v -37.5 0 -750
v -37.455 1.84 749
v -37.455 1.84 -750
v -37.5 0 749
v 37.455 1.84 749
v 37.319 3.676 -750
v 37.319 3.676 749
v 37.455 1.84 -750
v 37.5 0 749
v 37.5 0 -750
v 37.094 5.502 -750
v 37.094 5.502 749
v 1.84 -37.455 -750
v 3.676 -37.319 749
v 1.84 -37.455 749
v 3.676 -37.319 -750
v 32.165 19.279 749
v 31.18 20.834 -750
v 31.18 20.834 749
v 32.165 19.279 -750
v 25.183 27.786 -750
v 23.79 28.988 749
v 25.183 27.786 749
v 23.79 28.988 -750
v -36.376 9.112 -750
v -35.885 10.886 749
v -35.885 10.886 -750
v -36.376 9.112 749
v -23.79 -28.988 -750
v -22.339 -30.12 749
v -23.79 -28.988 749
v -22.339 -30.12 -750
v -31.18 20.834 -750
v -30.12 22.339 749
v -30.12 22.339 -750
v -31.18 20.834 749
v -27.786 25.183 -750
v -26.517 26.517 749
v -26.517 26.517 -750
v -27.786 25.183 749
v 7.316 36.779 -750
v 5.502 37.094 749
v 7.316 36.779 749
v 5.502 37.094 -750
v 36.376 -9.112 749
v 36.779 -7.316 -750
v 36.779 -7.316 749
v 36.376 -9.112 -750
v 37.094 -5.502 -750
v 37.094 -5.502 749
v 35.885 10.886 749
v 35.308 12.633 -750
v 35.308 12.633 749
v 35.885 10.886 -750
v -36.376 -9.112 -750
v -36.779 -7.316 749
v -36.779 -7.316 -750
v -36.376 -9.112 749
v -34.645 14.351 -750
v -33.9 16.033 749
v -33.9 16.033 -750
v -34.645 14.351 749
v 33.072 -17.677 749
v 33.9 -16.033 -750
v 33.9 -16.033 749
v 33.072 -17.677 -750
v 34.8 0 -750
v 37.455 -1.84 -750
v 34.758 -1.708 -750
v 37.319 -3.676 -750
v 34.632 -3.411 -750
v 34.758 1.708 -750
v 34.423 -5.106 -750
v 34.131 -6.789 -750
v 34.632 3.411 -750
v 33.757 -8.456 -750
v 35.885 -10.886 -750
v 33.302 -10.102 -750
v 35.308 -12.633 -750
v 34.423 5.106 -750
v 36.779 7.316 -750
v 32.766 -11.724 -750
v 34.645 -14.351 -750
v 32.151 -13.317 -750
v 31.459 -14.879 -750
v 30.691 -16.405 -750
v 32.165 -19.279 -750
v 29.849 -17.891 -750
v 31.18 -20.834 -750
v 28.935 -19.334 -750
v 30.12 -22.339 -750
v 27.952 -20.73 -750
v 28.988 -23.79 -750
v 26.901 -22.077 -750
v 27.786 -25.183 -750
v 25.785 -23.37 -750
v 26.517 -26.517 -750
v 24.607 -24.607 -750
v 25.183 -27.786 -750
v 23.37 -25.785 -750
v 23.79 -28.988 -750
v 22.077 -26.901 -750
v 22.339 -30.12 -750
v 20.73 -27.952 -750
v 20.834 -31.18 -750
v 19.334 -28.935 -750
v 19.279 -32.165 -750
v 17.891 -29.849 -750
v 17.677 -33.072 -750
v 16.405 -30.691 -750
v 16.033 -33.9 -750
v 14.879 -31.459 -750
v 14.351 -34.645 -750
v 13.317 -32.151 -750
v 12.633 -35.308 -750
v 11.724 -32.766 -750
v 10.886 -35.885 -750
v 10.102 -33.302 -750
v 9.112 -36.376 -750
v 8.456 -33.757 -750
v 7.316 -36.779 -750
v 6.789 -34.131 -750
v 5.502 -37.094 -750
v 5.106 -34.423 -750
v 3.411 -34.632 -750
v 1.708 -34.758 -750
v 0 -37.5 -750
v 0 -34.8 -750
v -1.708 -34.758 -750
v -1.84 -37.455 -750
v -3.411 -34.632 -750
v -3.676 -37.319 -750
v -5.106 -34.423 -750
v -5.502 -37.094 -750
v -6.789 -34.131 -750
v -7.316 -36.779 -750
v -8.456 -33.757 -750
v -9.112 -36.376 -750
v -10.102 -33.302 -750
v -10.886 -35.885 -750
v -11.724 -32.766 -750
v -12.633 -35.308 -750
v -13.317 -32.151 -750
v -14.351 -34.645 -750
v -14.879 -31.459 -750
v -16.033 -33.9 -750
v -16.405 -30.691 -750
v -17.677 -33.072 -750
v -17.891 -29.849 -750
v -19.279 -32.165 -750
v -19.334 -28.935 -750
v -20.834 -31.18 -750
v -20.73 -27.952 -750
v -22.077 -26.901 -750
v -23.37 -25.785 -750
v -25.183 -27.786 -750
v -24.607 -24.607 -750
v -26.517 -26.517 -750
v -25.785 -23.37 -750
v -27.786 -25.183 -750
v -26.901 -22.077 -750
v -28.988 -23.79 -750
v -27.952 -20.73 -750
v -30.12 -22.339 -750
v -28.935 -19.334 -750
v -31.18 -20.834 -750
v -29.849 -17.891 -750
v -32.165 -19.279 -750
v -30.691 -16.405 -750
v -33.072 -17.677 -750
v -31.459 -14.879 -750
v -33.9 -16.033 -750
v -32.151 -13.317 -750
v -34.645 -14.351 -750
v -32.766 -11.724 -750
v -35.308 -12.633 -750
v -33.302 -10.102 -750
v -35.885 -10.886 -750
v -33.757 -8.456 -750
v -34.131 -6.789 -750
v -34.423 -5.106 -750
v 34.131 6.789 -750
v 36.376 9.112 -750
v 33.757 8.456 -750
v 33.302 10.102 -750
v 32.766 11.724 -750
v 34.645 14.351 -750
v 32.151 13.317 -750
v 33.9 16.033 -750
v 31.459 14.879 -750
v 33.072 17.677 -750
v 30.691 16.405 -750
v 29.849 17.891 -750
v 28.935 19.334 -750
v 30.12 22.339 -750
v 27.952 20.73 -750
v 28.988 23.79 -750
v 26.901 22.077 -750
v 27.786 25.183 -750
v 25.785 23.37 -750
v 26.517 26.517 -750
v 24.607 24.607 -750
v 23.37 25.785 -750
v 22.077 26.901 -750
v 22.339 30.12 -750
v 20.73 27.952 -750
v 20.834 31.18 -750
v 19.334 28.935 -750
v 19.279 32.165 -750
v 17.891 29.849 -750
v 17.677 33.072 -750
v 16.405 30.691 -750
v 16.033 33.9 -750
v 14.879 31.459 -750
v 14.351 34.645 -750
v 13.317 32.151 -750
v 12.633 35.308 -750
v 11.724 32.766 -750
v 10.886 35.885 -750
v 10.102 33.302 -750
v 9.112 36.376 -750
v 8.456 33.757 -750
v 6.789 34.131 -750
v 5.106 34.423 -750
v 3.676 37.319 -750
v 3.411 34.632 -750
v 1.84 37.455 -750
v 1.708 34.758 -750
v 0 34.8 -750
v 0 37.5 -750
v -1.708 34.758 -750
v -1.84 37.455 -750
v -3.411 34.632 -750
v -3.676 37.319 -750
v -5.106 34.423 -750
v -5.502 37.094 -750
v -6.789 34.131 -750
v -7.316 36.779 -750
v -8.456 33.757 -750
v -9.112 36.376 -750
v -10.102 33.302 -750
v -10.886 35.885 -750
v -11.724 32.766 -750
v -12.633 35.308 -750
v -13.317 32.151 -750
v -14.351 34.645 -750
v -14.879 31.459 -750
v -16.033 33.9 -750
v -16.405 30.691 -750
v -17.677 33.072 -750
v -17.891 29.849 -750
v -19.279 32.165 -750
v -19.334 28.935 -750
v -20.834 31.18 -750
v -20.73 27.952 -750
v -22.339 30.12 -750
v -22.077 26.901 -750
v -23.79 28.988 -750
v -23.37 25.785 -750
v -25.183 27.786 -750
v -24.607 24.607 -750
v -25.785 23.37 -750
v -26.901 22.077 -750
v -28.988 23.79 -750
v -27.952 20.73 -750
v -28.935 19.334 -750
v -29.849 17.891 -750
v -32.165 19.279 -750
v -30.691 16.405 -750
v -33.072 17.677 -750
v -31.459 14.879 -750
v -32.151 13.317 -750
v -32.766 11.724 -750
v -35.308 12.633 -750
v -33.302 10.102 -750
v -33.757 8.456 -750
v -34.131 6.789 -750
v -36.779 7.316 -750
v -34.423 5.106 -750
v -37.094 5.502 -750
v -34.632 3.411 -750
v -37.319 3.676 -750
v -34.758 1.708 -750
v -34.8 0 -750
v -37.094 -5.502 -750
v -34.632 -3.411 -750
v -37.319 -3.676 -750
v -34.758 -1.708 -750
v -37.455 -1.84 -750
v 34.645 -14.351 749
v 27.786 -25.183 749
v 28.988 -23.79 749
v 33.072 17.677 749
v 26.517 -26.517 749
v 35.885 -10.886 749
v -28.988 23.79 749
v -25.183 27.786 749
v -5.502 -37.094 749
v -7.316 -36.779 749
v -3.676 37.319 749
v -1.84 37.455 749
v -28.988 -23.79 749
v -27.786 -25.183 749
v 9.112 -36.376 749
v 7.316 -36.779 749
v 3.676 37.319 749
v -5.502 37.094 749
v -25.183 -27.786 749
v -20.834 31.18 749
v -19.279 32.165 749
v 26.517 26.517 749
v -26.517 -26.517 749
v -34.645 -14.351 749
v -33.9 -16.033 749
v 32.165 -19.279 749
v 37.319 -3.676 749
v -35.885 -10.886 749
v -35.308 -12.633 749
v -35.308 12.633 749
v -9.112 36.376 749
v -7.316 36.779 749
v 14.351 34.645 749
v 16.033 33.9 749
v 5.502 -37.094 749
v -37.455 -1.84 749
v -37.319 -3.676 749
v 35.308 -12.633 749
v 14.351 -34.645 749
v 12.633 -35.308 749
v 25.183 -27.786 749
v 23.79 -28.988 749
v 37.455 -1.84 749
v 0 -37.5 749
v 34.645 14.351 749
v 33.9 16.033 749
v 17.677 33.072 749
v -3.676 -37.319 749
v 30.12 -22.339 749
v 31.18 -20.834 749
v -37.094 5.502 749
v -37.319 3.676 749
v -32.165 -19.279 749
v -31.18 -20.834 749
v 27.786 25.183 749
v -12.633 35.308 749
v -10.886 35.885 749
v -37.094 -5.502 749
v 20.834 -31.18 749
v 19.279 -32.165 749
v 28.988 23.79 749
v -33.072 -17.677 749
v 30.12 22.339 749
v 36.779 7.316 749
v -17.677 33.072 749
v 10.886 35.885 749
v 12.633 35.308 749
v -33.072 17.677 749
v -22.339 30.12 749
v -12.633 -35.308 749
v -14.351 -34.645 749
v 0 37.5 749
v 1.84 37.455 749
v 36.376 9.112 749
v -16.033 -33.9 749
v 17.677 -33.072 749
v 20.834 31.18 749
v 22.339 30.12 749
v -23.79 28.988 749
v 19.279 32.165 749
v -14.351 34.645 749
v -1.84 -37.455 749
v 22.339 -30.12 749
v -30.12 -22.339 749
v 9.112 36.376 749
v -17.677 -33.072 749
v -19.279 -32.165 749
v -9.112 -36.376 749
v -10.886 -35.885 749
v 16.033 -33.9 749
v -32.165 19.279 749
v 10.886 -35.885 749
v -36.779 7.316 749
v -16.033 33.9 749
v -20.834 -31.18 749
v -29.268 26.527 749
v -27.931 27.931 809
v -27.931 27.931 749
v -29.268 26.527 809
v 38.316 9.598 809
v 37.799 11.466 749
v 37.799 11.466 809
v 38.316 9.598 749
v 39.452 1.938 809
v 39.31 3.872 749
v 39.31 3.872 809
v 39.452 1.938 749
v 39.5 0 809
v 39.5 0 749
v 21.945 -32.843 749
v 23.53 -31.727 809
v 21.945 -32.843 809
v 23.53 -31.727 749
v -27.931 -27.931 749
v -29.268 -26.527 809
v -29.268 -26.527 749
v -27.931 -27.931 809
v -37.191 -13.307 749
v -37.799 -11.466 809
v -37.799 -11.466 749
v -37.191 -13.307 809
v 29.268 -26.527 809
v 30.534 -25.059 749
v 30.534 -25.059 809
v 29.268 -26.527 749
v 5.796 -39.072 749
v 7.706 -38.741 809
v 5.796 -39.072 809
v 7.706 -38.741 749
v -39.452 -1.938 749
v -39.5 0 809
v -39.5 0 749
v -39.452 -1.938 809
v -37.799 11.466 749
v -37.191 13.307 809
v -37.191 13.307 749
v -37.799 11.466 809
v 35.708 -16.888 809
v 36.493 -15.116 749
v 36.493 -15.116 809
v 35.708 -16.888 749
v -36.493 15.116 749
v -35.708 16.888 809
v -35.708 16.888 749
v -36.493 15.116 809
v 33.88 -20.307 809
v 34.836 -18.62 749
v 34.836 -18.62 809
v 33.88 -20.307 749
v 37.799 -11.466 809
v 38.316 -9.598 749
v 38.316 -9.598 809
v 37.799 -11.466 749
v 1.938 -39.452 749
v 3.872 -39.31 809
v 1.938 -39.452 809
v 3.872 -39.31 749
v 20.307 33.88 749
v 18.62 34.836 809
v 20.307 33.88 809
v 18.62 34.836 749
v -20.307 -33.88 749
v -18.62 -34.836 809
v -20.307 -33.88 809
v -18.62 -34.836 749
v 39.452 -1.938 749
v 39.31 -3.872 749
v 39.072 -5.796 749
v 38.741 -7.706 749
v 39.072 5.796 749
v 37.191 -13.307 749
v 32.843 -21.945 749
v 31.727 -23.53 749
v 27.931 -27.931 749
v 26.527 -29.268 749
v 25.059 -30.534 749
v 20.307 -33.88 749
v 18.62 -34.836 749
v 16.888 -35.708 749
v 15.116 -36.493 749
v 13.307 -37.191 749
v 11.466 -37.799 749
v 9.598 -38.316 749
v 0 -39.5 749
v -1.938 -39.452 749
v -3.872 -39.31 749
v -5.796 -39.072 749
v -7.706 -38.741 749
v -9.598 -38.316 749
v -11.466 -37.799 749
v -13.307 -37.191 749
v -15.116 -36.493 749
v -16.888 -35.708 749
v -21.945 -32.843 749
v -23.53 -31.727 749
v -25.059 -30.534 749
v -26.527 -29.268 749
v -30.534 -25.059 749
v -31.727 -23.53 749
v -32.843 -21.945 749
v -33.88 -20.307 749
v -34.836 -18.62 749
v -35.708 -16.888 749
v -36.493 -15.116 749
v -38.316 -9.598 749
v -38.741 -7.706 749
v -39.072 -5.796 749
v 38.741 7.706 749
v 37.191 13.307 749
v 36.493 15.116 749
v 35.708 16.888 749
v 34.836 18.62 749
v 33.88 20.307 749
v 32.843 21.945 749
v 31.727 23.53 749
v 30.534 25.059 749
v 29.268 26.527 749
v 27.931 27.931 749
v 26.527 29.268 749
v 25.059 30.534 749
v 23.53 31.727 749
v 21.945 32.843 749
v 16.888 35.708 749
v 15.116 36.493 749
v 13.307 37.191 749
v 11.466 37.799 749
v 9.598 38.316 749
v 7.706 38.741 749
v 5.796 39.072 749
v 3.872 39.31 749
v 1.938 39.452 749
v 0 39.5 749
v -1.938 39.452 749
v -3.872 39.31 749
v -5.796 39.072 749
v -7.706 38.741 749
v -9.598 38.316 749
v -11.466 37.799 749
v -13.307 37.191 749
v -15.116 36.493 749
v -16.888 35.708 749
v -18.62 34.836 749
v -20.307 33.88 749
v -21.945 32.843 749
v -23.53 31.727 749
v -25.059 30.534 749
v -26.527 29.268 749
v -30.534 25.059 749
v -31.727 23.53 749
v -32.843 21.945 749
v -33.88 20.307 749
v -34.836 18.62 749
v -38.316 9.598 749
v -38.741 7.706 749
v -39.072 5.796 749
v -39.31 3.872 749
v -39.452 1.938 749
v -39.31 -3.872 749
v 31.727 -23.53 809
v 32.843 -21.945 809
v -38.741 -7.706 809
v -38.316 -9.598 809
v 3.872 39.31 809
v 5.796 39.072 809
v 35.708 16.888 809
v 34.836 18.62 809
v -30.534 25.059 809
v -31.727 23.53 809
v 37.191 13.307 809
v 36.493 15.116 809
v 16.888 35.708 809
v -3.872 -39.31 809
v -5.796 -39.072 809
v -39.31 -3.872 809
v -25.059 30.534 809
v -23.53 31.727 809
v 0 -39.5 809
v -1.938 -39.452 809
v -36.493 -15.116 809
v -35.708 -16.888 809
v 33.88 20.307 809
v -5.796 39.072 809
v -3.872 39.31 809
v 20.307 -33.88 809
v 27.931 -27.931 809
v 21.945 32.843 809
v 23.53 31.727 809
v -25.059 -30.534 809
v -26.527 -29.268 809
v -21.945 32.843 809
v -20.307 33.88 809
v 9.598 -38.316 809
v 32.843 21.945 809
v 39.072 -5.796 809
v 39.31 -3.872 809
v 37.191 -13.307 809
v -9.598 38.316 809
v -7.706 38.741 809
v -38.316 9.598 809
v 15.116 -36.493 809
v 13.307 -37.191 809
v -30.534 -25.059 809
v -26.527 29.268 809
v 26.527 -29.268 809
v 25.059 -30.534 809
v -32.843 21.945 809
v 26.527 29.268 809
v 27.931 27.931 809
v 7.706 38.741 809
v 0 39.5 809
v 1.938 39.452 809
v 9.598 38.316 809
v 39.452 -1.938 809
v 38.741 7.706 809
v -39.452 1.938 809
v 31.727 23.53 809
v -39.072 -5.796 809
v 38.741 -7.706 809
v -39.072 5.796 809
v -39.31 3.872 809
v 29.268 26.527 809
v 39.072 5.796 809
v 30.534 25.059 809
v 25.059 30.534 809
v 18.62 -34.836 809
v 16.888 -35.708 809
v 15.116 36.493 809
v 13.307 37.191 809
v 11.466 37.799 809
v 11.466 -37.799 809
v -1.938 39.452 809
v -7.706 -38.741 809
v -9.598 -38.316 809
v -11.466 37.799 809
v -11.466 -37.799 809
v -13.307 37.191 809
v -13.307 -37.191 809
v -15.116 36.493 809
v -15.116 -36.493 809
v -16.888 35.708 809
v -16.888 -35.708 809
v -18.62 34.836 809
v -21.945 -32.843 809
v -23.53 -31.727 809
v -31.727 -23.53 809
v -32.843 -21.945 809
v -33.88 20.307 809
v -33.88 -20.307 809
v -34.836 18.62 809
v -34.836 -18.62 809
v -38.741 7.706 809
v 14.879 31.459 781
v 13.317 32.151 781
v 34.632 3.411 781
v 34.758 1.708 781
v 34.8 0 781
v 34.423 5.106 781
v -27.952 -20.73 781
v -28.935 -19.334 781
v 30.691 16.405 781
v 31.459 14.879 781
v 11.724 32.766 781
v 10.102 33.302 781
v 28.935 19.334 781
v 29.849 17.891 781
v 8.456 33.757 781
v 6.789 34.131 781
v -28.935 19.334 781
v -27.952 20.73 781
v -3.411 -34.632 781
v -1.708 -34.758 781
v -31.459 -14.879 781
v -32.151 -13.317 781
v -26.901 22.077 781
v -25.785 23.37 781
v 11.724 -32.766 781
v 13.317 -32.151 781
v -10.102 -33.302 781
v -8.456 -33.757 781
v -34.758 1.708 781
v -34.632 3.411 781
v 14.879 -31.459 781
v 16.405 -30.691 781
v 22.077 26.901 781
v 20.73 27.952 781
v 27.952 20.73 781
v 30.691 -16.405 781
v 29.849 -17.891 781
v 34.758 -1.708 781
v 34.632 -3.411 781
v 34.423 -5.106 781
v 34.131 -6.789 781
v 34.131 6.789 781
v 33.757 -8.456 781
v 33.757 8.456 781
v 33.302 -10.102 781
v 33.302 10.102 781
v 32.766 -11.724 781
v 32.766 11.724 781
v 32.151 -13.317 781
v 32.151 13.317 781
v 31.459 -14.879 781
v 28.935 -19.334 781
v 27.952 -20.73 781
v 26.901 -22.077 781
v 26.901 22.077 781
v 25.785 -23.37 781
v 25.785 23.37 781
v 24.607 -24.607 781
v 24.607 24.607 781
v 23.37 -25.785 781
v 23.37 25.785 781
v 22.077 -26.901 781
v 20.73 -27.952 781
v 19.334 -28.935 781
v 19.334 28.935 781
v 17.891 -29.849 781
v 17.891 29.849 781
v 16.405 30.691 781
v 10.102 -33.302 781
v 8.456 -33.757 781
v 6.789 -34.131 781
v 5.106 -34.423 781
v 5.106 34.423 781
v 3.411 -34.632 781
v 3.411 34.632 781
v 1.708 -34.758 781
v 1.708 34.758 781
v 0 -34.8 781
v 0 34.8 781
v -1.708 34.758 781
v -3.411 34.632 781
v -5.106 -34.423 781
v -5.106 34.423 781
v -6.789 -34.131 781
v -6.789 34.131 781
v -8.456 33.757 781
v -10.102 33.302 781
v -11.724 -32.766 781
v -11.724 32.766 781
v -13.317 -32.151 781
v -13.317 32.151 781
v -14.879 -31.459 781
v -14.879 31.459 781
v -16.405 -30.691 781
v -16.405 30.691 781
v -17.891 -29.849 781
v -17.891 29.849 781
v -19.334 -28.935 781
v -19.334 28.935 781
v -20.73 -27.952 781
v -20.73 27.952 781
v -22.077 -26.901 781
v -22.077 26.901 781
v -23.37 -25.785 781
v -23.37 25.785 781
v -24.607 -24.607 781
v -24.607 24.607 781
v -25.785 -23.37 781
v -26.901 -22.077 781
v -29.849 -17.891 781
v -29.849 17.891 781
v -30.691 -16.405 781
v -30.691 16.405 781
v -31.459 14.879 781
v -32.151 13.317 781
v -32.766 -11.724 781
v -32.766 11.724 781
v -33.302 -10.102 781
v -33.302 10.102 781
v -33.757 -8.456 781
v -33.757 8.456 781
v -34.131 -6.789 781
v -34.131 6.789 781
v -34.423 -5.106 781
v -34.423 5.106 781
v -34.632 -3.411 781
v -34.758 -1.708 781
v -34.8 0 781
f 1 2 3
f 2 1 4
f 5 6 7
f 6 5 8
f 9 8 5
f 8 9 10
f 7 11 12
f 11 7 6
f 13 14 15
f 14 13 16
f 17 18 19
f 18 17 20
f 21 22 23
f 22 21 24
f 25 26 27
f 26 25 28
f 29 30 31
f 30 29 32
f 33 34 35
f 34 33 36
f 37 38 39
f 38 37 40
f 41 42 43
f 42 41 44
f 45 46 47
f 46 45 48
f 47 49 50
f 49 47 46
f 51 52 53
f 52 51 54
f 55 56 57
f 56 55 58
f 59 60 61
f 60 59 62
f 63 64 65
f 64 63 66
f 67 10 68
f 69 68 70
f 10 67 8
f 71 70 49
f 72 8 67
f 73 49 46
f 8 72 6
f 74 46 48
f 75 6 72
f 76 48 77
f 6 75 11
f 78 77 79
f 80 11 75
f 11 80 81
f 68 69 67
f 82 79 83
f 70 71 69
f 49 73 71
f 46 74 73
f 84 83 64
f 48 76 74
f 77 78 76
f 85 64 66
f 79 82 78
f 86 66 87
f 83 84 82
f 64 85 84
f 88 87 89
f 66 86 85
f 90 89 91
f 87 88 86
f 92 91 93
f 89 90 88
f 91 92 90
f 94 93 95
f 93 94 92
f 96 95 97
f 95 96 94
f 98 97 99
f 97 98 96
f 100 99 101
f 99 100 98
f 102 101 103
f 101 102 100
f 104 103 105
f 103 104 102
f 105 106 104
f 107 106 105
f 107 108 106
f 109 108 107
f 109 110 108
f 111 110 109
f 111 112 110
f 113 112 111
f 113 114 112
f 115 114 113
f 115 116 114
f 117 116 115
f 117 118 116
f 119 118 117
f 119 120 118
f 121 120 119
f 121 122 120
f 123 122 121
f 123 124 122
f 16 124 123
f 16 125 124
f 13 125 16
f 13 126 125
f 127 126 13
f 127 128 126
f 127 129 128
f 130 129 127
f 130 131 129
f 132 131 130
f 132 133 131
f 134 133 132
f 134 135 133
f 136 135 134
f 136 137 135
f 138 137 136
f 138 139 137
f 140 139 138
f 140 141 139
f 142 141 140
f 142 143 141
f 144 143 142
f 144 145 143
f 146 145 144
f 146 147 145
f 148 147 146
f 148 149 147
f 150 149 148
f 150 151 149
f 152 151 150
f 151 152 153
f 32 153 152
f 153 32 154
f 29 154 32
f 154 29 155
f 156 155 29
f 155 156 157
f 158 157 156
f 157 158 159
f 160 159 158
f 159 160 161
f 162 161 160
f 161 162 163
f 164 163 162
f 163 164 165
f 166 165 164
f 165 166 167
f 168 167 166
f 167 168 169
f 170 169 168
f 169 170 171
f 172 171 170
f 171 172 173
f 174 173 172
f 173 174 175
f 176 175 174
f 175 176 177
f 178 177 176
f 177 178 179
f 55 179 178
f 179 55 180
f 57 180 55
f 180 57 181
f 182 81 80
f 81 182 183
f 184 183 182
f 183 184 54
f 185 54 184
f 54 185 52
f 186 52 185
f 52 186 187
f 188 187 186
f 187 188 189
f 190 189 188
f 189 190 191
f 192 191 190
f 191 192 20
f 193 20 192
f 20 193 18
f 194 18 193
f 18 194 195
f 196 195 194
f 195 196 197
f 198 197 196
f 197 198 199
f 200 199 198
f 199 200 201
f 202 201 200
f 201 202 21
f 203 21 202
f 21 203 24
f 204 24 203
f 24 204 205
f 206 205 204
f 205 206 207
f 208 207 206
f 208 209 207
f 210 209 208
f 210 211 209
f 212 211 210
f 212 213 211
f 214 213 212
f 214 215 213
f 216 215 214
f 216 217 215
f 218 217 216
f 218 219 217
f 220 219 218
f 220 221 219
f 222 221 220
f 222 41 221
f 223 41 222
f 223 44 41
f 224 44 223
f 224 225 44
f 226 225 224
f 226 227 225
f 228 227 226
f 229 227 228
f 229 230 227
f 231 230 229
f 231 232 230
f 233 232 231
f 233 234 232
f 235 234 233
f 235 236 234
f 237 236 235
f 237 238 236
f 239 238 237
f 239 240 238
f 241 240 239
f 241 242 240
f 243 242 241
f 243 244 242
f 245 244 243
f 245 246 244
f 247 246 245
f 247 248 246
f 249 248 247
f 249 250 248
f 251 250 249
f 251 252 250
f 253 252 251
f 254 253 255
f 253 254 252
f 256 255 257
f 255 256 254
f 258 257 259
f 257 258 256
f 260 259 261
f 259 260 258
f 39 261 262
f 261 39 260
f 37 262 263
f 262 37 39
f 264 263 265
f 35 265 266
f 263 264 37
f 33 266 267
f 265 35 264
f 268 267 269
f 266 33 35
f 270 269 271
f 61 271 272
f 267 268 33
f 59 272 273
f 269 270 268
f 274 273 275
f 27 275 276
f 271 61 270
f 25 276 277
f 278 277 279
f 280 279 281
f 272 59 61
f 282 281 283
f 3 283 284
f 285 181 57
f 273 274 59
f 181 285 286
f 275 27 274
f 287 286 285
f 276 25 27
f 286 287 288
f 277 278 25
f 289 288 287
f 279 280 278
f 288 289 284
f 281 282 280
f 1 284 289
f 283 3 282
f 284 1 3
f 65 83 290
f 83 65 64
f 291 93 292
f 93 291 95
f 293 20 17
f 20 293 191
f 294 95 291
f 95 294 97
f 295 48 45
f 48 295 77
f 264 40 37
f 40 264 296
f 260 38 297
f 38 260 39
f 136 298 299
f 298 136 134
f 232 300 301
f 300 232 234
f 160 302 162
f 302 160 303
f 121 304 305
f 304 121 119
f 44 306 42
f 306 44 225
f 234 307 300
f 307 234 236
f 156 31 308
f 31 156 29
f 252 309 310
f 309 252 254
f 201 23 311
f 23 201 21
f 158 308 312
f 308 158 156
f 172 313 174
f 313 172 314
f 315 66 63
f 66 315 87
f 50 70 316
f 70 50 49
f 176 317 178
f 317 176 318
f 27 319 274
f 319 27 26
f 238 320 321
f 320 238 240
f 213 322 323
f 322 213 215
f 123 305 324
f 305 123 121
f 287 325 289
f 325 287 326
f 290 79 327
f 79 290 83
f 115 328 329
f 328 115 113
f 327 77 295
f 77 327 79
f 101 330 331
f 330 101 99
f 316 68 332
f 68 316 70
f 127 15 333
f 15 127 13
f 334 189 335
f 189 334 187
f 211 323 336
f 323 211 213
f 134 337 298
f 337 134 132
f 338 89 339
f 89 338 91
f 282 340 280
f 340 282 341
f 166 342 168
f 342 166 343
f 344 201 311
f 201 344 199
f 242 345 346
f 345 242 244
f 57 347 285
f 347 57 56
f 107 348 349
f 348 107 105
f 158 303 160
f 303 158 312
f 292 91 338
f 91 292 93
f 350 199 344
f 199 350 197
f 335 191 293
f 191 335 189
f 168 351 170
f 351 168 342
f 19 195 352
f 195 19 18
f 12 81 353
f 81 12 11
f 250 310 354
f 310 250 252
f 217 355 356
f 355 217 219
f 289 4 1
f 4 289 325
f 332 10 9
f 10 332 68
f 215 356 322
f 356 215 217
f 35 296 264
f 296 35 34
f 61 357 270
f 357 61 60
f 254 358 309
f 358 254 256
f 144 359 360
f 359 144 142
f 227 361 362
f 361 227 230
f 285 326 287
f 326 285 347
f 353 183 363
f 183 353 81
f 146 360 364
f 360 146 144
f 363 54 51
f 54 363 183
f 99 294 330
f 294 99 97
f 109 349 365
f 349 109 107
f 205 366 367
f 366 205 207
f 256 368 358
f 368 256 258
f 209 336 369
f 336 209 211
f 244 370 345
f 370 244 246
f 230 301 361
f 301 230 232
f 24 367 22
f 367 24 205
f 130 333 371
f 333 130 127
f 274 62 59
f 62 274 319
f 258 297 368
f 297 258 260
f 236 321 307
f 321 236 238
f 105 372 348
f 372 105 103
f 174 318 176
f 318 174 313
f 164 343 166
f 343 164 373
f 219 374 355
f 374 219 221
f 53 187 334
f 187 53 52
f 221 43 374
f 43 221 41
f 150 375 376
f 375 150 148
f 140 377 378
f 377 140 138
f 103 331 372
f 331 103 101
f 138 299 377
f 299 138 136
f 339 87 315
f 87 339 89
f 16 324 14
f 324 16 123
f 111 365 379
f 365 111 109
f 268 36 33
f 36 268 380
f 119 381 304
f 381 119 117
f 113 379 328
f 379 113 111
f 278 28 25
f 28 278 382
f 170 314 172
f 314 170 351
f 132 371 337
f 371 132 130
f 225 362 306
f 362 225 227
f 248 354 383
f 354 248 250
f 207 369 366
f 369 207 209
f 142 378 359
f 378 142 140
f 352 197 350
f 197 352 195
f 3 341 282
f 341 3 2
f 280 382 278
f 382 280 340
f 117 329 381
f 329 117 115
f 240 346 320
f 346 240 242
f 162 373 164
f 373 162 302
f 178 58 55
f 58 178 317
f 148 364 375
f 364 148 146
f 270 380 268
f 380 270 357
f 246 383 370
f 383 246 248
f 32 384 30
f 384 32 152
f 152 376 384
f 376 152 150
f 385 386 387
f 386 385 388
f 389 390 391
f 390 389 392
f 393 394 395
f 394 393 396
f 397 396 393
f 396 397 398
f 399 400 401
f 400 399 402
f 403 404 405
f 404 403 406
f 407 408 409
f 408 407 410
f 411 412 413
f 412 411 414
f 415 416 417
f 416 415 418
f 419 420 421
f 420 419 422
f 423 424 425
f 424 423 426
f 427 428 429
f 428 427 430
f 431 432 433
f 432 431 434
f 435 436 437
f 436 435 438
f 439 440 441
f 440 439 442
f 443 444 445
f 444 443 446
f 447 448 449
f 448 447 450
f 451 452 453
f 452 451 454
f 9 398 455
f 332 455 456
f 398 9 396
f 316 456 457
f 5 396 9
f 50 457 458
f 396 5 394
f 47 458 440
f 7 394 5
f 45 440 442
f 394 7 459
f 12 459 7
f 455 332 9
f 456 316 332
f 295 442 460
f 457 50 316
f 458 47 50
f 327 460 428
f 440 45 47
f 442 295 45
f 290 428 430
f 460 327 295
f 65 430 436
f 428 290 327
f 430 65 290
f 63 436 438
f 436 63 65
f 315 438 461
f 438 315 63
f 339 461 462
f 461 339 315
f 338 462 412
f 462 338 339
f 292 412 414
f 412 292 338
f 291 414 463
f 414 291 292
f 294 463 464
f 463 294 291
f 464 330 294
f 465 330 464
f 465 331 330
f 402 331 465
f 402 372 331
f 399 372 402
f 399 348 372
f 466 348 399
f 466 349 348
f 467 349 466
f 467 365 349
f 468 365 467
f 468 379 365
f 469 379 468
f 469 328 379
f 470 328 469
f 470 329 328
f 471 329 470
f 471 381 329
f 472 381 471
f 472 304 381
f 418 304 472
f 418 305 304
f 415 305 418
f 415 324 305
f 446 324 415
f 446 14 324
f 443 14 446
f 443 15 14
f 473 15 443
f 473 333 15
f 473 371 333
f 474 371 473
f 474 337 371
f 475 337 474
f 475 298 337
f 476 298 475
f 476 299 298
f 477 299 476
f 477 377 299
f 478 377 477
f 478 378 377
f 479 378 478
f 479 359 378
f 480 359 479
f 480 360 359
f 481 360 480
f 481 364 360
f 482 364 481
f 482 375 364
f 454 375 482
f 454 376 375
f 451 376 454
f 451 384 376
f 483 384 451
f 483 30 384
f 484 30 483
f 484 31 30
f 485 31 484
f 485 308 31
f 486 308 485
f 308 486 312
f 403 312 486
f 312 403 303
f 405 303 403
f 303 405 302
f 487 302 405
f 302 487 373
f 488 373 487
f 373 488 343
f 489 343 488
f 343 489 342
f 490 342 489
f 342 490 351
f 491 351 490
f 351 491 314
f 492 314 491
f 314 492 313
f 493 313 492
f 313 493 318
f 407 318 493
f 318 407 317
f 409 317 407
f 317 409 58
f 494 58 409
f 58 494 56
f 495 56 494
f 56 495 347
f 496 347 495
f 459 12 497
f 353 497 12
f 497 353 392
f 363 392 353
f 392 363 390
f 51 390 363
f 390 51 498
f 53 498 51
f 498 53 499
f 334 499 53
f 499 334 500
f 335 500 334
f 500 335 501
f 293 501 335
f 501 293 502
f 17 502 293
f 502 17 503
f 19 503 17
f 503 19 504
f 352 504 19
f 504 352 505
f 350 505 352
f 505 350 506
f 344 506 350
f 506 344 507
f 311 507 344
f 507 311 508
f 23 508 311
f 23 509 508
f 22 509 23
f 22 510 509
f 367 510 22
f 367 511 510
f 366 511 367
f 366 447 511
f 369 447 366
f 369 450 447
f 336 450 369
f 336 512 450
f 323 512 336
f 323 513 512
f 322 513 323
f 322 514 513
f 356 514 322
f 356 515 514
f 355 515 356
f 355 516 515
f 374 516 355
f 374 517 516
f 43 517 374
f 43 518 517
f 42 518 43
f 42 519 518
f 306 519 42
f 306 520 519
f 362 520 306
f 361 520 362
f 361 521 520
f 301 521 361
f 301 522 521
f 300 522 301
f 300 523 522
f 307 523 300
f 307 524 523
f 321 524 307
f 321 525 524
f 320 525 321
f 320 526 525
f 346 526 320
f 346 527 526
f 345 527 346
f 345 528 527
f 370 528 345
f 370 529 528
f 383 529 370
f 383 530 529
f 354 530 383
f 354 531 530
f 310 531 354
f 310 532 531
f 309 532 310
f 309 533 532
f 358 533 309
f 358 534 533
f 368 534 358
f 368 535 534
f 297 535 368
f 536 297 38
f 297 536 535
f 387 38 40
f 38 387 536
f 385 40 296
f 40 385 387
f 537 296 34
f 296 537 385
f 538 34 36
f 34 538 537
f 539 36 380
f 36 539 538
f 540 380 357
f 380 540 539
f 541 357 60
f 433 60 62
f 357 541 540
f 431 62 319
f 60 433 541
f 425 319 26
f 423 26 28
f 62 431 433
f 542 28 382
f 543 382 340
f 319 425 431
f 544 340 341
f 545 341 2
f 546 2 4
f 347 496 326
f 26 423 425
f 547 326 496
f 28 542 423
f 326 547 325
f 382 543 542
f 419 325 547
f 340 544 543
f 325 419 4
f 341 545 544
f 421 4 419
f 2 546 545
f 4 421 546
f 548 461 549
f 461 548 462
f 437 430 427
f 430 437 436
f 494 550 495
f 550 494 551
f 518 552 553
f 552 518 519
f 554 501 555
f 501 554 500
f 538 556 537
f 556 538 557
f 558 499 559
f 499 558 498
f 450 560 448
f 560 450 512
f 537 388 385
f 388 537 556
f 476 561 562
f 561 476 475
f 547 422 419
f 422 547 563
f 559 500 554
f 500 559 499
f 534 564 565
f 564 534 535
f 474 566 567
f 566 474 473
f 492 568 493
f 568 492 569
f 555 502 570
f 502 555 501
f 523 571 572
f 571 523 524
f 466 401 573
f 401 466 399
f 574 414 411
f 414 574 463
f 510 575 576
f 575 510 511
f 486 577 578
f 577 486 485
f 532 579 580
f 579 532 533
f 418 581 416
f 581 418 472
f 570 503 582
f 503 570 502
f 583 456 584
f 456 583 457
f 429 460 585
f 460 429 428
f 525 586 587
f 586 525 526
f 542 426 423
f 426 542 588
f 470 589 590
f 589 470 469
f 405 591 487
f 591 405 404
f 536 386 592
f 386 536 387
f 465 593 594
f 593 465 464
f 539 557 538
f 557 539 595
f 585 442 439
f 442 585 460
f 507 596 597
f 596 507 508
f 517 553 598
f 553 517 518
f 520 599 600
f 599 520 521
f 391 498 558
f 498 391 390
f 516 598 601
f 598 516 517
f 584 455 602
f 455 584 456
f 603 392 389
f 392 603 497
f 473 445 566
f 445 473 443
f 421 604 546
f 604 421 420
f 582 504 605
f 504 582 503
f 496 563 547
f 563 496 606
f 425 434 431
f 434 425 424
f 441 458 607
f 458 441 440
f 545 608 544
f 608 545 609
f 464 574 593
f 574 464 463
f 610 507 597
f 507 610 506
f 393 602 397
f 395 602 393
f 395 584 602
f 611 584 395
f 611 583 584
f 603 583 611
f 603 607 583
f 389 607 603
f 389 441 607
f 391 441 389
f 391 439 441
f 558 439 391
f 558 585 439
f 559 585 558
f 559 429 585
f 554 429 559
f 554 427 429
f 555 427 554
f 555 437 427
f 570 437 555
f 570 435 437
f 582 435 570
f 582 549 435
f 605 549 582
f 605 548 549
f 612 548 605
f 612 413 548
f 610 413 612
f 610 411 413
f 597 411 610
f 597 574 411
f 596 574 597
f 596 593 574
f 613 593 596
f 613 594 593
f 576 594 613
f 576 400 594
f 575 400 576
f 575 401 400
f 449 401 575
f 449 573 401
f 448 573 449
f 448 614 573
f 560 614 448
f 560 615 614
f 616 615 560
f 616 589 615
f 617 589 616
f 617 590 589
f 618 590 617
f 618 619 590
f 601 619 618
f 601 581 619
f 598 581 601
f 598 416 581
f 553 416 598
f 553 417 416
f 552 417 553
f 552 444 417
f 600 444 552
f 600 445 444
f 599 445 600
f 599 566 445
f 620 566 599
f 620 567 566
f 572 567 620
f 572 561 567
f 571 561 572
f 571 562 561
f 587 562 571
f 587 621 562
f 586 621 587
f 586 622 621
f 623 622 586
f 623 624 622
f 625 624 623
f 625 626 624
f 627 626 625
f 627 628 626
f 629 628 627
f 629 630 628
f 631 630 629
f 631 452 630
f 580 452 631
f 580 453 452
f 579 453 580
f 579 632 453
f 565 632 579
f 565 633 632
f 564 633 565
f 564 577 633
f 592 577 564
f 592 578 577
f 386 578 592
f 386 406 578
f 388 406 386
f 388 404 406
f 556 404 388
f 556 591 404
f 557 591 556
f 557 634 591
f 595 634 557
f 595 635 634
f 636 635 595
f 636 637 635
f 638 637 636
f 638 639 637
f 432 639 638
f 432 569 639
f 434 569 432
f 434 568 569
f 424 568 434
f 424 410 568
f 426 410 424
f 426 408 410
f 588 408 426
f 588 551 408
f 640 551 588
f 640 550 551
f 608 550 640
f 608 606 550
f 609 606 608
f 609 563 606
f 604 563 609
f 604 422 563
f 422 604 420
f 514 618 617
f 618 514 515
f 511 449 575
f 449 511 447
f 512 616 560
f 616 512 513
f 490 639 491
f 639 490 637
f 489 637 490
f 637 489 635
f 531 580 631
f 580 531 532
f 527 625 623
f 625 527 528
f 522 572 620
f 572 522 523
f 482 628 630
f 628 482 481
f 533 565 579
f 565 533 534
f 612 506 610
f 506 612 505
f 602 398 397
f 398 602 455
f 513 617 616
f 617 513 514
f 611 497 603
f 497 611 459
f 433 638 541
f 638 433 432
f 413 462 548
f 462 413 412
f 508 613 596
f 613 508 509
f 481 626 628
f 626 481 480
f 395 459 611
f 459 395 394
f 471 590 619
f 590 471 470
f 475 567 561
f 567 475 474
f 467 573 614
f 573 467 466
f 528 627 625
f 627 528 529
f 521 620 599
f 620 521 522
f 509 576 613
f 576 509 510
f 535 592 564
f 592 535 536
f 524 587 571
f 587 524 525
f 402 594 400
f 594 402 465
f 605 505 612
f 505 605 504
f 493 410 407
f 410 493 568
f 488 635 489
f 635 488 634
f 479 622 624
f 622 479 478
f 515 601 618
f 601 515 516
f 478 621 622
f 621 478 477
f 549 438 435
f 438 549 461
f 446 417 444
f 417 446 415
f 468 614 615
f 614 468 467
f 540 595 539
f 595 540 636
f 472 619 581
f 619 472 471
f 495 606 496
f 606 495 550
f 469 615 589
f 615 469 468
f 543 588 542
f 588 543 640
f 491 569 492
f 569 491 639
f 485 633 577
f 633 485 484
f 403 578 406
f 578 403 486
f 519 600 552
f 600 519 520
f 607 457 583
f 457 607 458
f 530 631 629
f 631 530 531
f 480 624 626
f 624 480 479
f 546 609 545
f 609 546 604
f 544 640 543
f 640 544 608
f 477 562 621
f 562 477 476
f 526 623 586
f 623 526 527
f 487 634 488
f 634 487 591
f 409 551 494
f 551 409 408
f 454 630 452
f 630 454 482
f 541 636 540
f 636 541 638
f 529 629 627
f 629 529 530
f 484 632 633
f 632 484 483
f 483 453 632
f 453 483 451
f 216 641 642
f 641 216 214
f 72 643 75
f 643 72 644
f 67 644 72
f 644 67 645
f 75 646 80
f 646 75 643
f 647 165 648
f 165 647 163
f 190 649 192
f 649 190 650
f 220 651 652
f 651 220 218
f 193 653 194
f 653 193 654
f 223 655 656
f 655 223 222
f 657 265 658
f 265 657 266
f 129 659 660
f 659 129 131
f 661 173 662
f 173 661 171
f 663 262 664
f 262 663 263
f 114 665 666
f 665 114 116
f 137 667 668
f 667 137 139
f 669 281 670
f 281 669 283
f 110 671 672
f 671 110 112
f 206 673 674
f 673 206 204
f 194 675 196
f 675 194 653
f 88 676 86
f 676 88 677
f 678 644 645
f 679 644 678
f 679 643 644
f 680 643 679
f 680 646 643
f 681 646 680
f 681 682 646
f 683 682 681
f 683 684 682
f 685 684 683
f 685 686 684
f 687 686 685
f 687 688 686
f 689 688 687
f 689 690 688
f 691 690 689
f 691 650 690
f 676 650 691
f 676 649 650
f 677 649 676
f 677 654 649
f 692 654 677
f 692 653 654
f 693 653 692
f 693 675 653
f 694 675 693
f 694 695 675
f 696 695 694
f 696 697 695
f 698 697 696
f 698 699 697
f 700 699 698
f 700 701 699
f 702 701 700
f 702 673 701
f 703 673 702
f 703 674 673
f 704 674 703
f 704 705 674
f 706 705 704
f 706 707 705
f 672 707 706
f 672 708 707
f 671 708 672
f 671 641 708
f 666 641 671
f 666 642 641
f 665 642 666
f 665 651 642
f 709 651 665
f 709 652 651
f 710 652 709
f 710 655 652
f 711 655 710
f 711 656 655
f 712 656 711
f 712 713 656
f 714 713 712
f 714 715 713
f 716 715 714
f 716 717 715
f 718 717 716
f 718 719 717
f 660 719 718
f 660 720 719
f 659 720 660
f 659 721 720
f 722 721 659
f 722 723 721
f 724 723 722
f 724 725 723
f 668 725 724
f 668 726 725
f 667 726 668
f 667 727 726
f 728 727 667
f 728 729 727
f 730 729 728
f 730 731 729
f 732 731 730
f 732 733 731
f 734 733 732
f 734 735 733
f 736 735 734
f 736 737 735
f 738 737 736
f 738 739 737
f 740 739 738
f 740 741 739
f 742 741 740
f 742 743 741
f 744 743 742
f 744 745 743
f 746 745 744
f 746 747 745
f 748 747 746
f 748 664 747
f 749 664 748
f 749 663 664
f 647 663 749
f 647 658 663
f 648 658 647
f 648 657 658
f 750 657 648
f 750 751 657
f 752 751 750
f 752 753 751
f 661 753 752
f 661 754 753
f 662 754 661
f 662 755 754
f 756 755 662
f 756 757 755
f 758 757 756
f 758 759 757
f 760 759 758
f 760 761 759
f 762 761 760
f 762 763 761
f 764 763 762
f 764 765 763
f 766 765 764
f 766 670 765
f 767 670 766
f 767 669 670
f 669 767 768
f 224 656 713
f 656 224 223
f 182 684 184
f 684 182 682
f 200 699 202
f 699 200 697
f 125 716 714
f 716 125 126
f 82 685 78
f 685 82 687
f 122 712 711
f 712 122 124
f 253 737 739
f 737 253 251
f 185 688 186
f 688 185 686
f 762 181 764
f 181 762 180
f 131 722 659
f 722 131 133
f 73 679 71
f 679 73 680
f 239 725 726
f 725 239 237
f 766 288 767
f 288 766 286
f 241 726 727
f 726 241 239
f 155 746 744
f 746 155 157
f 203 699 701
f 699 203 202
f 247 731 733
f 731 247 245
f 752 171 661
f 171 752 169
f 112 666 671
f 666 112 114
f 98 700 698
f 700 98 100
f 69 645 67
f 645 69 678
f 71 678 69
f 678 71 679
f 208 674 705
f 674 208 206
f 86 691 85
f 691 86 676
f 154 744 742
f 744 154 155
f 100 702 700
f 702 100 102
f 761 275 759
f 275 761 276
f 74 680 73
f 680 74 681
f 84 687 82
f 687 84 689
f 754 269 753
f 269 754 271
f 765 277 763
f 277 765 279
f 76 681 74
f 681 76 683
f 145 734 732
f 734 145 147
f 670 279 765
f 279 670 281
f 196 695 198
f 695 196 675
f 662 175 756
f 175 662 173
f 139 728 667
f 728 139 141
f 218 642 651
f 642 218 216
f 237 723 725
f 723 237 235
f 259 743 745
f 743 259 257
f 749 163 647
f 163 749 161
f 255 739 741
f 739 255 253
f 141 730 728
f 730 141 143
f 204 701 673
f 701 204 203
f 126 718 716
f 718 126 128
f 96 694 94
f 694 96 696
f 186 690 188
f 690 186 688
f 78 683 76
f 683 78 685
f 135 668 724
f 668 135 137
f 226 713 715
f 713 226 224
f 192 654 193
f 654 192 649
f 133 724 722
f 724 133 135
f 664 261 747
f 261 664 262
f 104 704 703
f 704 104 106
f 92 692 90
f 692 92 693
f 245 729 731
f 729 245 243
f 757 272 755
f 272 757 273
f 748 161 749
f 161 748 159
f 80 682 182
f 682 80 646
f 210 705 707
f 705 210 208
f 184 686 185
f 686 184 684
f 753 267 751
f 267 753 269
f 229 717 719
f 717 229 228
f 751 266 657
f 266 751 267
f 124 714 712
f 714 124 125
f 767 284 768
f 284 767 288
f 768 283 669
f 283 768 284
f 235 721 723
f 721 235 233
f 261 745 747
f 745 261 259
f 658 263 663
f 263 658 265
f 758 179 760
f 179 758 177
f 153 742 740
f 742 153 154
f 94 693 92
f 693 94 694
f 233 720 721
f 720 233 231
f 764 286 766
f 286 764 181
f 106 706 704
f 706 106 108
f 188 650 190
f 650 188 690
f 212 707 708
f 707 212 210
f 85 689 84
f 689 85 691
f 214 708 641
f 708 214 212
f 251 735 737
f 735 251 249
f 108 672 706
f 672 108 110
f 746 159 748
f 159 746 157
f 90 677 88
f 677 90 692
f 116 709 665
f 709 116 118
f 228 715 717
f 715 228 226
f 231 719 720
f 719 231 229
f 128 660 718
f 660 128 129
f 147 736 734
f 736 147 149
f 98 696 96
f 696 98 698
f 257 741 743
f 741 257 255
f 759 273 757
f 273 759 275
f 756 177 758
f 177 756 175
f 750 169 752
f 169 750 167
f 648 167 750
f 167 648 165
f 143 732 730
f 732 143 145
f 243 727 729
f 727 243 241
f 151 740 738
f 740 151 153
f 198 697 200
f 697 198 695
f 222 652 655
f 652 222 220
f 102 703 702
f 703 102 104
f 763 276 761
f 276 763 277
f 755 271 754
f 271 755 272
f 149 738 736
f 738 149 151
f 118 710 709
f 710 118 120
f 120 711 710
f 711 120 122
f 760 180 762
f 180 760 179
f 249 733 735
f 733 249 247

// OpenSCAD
// Parameters
pipe_standard = 1; //[1:1:1]
nominal_diameter_mm = 75; //[40:150:1]
length_mm = 1500; //[750:3000:10]
wall_thickness_mm = 2.7; //[1.5:6:0.1]
fitting_length_mm = 60; //[30:120:1]
fitting_wall_extra_mm = 2.0; //[0.5:6:0.1]
connection_overlap_mm = 1.0; //[0.5:2.0:0.1]

$fn = 128;

// HT Pipe - one connected solid (pipe + socket)
module ht_pipe() {
    outer_r = nominal_diameter_mm/2;
    inner_r = outer_r - wall_thickness_mm;
    socket_outer_r = outer_r + fitting_wall_extra_mm;

    // Ensure valid geometry
    inner_r_ok = max(0.01, inner_r);

    // Z placement so socket overlaps the main pipe by connection_overlap_mm
    // Main pipe spans: [-length/2, +length/2]
    // Socket spans: [socket_center - fitting/2, socket_center + fitting/2]
    // Set socket_start = length/2 - overlap
    socket_center_z = (length_mm/2 - connection_overlap_mm) + fitting_length_mm/2;

    color([0.85, 0.85, 0.8])
    difference() {
        // OUTER: union of main OD + socket OD (connected via overlap)
        union() {
            cylinder(h=length_mm, r=outer_r, center=true);
            translate([0, 0, socket_center_z])
                cylinder(h=fitting_length_mm, r=socket_outer_r, center=true);
        }

        // INNER: continuous bore through entire part (extends beyond to guarantee clean subtraction)
        cylinder(h=length_mm + fitting_length_mm + 2, r=inner_r_ok, center=true);
    }
}

// Assembly
module assembly() {
    ht_pipe();
}

assembly();
